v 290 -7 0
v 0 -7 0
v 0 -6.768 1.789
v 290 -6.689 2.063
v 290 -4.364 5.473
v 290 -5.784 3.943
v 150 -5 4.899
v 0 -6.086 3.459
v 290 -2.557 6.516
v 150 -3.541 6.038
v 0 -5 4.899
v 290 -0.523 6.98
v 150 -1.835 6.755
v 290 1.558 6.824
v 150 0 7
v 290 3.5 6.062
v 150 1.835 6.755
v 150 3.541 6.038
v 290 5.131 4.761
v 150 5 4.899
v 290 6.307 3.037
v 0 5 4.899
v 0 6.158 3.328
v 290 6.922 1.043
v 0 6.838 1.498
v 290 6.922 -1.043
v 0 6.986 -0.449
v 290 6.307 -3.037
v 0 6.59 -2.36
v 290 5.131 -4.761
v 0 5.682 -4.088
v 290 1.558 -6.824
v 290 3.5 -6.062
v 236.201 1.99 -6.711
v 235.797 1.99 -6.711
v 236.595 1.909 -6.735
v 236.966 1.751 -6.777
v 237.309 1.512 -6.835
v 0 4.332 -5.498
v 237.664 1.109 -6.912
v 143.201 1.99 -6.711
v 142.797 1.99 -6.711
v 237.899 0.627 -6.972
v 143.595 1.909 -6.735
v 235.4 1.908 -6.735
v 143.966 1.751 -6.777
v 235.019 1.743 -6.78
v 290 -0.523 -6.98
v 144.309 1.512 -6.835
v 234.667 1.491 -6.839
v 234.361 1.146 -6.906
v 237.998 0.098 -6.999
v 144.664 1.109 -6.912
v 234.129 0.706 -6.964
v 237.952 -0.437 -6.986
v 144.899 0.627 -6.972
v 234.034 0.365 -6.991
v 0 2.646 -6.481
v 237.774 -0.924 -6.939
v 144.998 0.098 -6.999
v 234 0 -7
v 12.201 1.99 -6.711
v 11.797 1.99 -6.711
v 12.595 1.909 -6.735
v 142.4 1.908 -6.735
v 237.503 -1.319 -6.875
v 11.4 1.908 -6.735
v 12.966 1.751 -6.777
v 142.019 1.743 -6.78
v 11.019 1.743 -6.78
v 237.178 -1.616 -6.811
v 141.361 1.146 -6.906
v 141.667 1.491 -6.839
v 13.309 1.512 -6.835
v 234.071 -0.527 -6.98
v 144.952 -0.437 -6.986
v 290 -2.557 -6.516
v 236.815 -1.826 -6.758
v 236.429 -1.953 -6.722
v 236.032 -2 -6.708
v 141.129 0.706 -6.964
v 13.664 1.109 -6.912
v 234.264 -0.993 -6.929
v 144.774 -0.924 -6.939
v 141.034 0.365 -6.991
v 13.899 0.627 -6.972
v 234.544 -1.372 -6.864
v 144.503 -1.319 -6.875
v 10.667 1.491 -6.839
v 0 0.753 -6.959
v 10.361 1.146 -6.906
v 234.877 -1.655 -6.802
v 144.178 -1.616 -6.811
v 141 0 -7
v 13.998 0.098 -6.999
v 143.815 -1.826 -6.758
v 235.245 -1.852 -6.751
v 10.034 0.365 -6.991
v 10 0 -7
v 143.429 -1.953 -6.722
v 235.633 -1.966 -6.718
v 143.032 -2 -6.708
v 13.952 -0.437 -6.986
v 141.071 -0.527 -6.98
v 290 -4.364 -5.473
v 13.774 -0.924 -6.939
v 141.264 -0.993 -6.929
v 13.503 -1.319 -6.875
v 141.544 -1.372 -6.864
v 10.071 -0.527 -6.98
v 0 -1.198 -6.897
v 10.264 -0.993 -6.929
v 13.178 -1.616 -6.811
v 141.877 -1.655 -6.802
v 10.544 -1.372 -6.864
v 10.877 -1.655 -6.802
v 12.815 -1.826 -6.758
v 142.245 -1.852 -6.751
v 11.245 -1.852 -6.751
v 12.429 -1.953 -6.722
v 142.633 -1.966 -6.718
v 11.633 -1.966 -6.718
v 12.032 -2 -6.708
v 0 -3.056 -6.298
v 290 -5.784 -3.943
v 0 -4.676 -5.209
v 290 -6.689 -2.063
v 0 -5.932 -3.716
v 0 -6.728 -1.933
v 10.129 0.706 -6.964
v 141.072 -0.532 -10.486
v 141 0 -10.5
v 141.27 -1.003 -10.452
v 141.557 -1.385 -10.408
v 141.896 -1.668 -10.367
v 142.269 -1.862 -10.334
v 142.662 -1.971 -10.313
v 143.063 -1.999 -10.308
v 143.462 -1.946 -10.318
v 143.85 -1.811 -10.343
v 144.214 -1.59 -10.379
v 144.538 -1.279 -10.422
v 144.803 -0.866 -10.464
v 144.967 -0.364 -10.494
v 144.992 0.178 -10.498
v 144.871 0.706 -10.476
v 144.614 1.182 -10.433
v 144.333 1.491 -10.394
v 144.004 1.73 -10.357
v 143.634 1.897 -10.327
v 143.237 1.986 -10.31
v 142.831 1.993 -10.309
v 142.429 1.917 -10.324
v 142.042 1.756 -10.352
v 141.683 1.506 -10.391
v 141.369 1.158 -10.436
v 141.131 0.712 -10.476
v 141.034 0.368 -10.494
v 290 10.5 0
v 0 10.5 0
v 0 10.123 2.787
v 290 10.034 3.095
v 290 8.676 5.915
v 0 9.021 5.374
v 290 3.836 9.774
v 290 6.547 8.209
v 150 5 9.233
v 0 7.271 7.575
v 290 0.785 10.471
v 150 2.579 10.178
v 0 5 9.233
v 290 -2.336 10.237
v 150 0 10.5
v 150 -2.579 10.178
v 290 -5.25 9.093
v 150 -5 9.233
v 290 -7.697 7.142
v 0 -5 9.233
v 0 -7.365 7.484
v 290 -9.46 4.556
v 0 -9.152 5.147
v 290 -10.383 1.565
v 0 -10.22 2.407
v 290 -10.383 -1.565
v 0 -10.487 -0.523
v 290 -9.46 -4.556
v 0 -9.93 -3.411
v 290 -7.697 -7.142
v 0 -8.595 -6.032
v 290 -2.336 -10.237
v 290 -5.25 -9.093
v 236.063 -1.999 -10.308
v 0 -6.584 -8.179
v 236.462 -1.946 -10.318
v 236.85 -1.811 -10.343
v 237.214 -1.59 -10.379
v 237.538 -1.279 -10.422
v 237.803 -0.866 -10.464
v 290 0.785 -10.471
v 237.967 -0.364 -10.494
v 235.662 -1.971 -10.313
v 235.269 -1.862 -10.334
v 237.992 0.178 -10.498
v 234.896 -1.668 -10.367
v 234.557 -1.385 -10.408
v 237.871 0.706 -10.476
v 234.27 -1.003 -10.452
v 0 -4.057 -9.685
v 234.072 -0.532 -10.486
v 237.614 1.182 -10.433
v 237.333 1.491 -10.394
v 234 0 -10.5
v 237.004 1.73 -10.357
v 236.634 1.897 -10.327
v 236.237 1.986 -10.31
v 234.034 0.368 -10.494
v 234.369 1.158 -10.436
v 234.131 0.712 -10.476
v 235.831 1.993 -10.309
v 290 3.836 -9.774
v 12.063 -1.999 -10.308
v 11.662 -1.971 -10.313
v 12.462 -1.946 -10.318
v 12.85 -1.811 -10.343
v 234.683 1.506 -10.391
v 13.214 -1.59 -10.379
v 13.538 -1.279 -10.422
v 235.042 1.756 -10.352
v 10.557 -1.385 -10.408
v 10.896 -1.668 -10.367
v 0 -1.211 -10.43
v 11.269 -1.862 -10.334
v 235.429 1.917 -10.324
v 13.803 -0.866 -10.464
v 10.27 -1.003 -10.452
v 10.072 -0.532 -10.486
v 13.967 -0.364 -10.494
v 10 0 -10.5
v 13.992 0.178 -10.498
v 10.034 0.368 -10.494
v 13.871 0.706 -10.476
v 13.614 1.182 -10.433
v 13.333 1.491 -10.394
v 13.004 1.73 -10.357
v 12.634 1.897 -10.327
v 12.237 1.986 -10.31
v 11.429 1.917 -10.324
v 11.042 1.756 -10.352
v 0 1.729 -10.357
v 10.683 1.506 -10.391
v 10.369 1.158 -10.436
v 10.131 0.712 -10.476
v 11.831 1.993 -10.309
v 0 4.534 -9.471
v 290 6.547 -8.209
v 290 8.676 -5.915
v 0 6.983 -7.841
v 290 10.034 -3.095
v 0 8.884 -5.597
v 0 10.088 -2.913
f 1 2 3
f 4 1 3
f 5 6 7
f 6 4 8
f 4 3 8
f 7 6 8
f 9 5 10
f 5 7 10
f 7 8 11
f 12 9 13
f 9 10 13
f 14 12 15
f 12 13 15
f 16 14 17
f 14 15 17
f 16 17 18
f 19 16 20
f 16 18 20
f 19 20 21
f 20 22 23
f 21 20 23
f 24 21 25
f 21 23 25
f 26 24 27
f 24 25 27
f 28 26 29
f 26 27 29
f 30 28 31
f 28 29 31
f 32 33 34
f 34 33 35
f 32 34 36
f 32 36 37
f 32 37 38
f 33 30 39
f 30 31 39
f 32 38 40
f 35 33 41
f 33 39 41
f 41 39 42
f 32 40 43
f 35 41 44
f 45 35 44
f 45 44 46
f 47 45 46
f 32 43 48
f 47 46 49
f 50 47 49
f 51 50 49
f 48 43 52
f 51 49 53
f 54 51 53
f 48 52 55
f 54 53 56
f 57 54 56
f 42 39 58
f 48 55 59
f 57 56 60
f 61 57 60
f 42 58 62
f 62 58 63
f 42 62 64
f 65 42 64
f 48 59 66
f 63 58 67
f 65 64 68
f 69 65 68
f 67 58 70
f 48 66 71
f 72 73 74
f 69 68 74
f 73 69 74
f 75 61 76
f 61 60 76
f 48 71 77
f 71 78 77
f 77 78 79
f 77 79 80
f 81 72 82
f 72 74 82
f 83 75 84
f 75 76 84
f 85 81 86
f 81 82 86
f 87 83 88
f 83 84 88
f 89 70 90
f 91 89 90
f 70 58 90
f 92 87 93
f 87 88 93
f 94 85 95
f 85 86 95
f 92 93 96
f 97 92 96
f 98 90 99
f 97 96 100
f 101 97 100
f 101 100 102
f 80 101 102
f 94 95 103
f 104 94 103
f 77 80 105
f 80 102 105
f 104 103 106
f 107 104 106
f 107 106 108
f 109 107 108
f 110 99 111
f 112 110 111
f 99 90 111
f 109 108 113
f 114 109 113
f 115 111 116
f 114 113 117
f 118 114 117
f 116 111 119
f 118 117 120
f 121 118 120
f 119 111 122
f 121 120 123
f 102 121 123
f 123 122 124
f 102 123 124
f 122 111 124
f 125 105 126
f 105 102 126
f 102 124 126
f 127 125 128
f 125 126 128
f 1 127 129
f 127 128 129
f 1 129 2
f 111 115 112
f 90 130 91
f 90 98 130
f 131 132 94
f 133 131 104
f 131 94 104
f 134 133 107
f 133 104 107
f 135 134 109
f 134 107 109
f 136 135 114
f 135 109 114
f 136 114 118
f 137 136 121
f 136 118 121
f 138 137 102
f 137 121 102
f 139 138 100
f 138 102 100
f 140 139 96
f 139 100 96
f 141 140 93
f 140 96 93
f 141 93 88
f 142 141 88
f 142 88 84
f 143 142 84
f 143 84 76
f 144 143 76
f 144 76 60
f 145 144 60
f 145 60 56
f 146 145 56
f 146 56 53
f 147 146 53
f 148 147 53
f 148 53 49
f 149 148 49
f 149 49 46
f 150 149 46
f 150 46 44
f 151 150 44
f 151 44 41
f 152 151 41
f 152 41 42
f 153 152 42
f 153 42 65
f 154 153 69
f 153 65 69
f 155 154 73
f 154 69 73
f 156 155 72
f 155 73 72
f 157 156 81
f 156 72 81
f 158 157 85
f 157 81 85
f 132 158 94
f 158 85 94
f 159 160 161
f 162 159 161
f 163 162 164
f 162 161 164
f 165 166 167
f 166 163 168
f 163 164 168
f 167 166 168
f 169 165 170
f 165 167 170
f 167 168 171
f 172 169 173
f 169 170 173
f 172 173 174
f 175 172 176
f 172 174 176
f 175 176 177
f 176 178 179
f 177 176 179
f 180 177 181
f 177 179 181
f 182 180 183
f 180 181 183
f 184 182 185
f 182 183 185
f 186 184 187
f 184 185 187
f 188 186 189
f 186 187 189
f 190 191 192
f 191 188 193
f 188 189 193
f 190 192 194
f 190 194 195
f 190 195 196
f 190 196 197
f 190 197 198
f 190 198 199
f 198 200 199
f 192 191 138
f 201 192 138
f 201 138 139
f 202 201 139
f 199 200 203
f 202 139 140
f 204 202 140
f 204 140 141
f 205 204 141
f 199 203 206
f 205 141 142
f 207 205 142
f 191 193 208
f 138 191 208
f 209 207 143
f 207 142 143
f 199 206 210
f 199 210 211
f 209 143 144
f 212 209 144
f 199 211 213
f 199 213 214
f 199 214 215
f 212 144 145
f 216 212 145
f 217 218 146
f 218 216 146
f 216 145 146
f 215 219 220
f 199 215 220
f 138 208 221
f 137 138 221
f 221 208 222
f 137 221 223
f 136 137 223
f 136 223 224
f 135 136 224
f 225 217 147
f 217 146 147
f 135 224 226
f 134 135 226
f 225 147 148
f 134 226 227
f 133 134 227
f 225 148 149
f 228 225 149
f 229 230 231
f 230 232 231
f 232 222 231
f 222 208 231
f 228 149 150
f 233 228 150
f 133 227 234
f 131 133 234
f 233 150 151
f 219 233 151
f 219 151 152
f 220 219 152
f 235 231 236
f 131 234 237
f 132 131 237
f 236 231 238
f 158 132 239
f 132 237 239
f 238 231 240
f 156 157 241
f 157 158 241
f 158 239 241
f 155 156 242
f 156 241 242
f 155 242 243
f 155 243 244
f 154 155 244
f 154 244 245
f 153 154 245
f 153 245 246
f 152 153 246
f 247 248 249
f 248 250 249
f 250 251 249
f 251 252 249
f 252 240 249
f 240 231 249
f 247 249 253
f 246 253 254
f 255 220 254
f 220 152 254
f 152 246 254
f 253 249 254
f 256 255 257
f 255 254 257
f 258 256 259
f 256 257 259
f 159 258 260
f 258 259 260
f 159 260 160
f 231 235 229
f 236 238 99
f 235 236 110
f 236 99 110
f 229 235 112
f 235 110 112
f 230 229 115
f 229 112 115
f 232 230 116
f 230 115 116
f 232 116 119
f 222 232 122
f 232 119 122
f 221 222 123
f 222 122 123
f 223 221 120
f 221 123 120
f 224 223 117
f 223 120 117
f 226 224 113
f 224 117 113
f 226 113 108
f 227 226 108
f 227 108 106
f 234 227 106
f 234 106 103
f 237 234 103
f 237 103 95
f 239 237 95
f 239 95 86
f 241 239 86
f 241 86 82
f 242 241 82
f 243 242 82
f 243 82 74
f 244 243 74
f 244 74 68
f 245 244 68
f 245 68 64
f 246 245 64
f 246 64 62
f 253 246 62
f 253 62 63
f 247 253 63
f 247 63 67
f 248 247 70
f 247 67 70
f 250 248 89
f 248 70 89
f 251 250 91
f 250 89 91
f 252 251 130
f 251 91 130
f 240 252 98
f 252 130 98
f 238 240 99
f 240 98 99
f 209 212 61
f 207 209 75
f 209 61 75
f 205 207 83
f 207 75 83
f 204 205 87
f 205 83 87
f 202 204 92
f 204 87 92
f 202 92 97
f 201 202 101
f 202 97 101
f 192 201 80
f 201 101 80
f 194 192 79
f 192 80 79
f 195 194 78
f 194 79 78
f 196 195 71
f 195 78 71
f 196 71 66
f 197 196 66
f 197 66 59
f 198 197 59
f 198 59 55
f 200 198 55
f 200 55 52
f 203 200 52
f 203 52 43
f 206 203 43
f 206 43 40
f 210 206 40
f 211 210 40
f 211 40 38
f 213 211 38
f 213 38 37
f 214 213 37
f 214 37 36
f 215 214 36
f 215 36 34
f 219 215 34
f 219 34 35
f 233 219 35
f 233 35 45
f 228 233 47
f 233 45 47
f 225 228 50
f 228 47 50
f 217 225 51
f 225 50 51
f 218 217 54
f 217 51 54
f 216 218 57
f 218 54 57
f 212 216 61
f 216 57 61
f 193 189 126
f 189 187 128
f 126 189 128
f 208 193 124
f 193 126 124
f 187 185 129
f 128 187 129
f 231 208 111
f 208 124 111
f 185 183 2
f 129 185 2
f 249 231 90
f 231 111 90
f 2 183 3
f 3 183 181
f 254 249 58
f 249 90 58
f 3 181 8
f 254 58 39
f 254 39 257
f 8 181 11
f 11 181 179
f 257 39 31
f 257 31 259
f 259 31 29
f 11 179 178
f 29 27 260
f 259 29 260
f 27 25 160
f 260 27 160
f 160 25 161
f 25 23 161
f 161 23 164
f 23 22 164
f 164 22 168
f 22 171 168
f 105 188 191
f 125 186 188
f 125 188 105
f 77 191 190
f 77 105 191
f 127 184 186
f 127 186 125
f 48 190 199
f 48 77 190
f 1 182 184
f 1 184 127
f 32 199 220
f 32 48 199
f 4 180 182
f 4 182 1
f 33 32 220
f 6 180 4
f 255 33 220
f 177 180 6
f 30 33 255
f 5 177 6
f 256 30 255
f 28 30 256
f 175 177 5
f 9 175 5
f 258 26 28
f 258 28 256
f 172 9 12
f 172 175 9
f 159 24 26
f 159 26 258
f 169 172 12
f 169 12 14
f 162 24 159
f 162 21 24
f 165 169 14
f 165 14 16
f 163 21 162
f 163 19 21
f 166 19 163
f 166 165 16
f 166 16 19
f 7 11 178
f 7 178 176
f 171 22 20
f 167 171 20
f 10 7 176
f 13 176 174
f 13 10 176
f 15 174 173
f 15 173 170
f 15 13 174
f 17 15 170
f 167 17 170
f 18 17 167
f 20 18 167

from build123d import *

# Parameters (mm, degrees)
F0_R     = 10.5
F1_DEPTH = 290
F2_R     = 7
F3_DEPTH = 300
F5_W     = 300
F5_H     = 10
F6_DEPTH = 25
F8_DEPTH = 25


with BuildPart() as f1:
    # F0 (on Right) → F1 (new body)
    with BuildSketch(Plane.YZ):
        Circle(F0_R)
    extrude(amount=F1_DEPTH)

    # F2 (on face) → F3 (cut)
    with BuildSketch(Plane(origin=(0, 0, 0), x_dir=(0, -1, 0), z_dir=(-1, 0, 0))):
        Circle(F2_R)
    extrude(amount=-F3_DEPTH, mode=Mode.SUBTRACT)

    # F5 (on Top) → F6 (cut)
    with BuildSketch(Plane.XY):
        Rectangle(F5_W, F5_H)
    extrude(amount=F6_DEPTH, mode=Mode.SUBTRACT)

    # F7 (on Top) → F8 (cut)
    with BuildSketch(Plane.XY):
        with BuildLine():
            ThreePointArc((14, 0), (12, 2), (10, 0))
            Line((10, 0), (12, 0))
            Line((12, 0), (14, 0))
        make_face()
        with BuildLine():
            ThreePointArc((238, 0), (236, 2), (234, 0))
            ThreePointArc((234, 0), (236, -2), (238, 0))
        make_face()
        with BuildLine():
            ThreePointArc((145, 0), (143, 2), (141, 0))
            Line((141, 0), (143, 0))
            Line((143, 0), (145, 0))
        make_face()
        with BuildLine():
            Line((143, 0), (141, 0))
            ThreePointArc((141, 0), (143, -2), (145, 0))
            Line((145, 0), (143, 0))
        make_face()
        with BuildLine():
            Line((12, 0), (10, 0))
            ThreePointArc((10, 0), (12, -2), (14, 0))
            Line((14, 0), (12, 0))
        make_face()
    extrude(amount=-F8_DEPTH, mode=Mode.SUBTRACT)


solid = f1.part
